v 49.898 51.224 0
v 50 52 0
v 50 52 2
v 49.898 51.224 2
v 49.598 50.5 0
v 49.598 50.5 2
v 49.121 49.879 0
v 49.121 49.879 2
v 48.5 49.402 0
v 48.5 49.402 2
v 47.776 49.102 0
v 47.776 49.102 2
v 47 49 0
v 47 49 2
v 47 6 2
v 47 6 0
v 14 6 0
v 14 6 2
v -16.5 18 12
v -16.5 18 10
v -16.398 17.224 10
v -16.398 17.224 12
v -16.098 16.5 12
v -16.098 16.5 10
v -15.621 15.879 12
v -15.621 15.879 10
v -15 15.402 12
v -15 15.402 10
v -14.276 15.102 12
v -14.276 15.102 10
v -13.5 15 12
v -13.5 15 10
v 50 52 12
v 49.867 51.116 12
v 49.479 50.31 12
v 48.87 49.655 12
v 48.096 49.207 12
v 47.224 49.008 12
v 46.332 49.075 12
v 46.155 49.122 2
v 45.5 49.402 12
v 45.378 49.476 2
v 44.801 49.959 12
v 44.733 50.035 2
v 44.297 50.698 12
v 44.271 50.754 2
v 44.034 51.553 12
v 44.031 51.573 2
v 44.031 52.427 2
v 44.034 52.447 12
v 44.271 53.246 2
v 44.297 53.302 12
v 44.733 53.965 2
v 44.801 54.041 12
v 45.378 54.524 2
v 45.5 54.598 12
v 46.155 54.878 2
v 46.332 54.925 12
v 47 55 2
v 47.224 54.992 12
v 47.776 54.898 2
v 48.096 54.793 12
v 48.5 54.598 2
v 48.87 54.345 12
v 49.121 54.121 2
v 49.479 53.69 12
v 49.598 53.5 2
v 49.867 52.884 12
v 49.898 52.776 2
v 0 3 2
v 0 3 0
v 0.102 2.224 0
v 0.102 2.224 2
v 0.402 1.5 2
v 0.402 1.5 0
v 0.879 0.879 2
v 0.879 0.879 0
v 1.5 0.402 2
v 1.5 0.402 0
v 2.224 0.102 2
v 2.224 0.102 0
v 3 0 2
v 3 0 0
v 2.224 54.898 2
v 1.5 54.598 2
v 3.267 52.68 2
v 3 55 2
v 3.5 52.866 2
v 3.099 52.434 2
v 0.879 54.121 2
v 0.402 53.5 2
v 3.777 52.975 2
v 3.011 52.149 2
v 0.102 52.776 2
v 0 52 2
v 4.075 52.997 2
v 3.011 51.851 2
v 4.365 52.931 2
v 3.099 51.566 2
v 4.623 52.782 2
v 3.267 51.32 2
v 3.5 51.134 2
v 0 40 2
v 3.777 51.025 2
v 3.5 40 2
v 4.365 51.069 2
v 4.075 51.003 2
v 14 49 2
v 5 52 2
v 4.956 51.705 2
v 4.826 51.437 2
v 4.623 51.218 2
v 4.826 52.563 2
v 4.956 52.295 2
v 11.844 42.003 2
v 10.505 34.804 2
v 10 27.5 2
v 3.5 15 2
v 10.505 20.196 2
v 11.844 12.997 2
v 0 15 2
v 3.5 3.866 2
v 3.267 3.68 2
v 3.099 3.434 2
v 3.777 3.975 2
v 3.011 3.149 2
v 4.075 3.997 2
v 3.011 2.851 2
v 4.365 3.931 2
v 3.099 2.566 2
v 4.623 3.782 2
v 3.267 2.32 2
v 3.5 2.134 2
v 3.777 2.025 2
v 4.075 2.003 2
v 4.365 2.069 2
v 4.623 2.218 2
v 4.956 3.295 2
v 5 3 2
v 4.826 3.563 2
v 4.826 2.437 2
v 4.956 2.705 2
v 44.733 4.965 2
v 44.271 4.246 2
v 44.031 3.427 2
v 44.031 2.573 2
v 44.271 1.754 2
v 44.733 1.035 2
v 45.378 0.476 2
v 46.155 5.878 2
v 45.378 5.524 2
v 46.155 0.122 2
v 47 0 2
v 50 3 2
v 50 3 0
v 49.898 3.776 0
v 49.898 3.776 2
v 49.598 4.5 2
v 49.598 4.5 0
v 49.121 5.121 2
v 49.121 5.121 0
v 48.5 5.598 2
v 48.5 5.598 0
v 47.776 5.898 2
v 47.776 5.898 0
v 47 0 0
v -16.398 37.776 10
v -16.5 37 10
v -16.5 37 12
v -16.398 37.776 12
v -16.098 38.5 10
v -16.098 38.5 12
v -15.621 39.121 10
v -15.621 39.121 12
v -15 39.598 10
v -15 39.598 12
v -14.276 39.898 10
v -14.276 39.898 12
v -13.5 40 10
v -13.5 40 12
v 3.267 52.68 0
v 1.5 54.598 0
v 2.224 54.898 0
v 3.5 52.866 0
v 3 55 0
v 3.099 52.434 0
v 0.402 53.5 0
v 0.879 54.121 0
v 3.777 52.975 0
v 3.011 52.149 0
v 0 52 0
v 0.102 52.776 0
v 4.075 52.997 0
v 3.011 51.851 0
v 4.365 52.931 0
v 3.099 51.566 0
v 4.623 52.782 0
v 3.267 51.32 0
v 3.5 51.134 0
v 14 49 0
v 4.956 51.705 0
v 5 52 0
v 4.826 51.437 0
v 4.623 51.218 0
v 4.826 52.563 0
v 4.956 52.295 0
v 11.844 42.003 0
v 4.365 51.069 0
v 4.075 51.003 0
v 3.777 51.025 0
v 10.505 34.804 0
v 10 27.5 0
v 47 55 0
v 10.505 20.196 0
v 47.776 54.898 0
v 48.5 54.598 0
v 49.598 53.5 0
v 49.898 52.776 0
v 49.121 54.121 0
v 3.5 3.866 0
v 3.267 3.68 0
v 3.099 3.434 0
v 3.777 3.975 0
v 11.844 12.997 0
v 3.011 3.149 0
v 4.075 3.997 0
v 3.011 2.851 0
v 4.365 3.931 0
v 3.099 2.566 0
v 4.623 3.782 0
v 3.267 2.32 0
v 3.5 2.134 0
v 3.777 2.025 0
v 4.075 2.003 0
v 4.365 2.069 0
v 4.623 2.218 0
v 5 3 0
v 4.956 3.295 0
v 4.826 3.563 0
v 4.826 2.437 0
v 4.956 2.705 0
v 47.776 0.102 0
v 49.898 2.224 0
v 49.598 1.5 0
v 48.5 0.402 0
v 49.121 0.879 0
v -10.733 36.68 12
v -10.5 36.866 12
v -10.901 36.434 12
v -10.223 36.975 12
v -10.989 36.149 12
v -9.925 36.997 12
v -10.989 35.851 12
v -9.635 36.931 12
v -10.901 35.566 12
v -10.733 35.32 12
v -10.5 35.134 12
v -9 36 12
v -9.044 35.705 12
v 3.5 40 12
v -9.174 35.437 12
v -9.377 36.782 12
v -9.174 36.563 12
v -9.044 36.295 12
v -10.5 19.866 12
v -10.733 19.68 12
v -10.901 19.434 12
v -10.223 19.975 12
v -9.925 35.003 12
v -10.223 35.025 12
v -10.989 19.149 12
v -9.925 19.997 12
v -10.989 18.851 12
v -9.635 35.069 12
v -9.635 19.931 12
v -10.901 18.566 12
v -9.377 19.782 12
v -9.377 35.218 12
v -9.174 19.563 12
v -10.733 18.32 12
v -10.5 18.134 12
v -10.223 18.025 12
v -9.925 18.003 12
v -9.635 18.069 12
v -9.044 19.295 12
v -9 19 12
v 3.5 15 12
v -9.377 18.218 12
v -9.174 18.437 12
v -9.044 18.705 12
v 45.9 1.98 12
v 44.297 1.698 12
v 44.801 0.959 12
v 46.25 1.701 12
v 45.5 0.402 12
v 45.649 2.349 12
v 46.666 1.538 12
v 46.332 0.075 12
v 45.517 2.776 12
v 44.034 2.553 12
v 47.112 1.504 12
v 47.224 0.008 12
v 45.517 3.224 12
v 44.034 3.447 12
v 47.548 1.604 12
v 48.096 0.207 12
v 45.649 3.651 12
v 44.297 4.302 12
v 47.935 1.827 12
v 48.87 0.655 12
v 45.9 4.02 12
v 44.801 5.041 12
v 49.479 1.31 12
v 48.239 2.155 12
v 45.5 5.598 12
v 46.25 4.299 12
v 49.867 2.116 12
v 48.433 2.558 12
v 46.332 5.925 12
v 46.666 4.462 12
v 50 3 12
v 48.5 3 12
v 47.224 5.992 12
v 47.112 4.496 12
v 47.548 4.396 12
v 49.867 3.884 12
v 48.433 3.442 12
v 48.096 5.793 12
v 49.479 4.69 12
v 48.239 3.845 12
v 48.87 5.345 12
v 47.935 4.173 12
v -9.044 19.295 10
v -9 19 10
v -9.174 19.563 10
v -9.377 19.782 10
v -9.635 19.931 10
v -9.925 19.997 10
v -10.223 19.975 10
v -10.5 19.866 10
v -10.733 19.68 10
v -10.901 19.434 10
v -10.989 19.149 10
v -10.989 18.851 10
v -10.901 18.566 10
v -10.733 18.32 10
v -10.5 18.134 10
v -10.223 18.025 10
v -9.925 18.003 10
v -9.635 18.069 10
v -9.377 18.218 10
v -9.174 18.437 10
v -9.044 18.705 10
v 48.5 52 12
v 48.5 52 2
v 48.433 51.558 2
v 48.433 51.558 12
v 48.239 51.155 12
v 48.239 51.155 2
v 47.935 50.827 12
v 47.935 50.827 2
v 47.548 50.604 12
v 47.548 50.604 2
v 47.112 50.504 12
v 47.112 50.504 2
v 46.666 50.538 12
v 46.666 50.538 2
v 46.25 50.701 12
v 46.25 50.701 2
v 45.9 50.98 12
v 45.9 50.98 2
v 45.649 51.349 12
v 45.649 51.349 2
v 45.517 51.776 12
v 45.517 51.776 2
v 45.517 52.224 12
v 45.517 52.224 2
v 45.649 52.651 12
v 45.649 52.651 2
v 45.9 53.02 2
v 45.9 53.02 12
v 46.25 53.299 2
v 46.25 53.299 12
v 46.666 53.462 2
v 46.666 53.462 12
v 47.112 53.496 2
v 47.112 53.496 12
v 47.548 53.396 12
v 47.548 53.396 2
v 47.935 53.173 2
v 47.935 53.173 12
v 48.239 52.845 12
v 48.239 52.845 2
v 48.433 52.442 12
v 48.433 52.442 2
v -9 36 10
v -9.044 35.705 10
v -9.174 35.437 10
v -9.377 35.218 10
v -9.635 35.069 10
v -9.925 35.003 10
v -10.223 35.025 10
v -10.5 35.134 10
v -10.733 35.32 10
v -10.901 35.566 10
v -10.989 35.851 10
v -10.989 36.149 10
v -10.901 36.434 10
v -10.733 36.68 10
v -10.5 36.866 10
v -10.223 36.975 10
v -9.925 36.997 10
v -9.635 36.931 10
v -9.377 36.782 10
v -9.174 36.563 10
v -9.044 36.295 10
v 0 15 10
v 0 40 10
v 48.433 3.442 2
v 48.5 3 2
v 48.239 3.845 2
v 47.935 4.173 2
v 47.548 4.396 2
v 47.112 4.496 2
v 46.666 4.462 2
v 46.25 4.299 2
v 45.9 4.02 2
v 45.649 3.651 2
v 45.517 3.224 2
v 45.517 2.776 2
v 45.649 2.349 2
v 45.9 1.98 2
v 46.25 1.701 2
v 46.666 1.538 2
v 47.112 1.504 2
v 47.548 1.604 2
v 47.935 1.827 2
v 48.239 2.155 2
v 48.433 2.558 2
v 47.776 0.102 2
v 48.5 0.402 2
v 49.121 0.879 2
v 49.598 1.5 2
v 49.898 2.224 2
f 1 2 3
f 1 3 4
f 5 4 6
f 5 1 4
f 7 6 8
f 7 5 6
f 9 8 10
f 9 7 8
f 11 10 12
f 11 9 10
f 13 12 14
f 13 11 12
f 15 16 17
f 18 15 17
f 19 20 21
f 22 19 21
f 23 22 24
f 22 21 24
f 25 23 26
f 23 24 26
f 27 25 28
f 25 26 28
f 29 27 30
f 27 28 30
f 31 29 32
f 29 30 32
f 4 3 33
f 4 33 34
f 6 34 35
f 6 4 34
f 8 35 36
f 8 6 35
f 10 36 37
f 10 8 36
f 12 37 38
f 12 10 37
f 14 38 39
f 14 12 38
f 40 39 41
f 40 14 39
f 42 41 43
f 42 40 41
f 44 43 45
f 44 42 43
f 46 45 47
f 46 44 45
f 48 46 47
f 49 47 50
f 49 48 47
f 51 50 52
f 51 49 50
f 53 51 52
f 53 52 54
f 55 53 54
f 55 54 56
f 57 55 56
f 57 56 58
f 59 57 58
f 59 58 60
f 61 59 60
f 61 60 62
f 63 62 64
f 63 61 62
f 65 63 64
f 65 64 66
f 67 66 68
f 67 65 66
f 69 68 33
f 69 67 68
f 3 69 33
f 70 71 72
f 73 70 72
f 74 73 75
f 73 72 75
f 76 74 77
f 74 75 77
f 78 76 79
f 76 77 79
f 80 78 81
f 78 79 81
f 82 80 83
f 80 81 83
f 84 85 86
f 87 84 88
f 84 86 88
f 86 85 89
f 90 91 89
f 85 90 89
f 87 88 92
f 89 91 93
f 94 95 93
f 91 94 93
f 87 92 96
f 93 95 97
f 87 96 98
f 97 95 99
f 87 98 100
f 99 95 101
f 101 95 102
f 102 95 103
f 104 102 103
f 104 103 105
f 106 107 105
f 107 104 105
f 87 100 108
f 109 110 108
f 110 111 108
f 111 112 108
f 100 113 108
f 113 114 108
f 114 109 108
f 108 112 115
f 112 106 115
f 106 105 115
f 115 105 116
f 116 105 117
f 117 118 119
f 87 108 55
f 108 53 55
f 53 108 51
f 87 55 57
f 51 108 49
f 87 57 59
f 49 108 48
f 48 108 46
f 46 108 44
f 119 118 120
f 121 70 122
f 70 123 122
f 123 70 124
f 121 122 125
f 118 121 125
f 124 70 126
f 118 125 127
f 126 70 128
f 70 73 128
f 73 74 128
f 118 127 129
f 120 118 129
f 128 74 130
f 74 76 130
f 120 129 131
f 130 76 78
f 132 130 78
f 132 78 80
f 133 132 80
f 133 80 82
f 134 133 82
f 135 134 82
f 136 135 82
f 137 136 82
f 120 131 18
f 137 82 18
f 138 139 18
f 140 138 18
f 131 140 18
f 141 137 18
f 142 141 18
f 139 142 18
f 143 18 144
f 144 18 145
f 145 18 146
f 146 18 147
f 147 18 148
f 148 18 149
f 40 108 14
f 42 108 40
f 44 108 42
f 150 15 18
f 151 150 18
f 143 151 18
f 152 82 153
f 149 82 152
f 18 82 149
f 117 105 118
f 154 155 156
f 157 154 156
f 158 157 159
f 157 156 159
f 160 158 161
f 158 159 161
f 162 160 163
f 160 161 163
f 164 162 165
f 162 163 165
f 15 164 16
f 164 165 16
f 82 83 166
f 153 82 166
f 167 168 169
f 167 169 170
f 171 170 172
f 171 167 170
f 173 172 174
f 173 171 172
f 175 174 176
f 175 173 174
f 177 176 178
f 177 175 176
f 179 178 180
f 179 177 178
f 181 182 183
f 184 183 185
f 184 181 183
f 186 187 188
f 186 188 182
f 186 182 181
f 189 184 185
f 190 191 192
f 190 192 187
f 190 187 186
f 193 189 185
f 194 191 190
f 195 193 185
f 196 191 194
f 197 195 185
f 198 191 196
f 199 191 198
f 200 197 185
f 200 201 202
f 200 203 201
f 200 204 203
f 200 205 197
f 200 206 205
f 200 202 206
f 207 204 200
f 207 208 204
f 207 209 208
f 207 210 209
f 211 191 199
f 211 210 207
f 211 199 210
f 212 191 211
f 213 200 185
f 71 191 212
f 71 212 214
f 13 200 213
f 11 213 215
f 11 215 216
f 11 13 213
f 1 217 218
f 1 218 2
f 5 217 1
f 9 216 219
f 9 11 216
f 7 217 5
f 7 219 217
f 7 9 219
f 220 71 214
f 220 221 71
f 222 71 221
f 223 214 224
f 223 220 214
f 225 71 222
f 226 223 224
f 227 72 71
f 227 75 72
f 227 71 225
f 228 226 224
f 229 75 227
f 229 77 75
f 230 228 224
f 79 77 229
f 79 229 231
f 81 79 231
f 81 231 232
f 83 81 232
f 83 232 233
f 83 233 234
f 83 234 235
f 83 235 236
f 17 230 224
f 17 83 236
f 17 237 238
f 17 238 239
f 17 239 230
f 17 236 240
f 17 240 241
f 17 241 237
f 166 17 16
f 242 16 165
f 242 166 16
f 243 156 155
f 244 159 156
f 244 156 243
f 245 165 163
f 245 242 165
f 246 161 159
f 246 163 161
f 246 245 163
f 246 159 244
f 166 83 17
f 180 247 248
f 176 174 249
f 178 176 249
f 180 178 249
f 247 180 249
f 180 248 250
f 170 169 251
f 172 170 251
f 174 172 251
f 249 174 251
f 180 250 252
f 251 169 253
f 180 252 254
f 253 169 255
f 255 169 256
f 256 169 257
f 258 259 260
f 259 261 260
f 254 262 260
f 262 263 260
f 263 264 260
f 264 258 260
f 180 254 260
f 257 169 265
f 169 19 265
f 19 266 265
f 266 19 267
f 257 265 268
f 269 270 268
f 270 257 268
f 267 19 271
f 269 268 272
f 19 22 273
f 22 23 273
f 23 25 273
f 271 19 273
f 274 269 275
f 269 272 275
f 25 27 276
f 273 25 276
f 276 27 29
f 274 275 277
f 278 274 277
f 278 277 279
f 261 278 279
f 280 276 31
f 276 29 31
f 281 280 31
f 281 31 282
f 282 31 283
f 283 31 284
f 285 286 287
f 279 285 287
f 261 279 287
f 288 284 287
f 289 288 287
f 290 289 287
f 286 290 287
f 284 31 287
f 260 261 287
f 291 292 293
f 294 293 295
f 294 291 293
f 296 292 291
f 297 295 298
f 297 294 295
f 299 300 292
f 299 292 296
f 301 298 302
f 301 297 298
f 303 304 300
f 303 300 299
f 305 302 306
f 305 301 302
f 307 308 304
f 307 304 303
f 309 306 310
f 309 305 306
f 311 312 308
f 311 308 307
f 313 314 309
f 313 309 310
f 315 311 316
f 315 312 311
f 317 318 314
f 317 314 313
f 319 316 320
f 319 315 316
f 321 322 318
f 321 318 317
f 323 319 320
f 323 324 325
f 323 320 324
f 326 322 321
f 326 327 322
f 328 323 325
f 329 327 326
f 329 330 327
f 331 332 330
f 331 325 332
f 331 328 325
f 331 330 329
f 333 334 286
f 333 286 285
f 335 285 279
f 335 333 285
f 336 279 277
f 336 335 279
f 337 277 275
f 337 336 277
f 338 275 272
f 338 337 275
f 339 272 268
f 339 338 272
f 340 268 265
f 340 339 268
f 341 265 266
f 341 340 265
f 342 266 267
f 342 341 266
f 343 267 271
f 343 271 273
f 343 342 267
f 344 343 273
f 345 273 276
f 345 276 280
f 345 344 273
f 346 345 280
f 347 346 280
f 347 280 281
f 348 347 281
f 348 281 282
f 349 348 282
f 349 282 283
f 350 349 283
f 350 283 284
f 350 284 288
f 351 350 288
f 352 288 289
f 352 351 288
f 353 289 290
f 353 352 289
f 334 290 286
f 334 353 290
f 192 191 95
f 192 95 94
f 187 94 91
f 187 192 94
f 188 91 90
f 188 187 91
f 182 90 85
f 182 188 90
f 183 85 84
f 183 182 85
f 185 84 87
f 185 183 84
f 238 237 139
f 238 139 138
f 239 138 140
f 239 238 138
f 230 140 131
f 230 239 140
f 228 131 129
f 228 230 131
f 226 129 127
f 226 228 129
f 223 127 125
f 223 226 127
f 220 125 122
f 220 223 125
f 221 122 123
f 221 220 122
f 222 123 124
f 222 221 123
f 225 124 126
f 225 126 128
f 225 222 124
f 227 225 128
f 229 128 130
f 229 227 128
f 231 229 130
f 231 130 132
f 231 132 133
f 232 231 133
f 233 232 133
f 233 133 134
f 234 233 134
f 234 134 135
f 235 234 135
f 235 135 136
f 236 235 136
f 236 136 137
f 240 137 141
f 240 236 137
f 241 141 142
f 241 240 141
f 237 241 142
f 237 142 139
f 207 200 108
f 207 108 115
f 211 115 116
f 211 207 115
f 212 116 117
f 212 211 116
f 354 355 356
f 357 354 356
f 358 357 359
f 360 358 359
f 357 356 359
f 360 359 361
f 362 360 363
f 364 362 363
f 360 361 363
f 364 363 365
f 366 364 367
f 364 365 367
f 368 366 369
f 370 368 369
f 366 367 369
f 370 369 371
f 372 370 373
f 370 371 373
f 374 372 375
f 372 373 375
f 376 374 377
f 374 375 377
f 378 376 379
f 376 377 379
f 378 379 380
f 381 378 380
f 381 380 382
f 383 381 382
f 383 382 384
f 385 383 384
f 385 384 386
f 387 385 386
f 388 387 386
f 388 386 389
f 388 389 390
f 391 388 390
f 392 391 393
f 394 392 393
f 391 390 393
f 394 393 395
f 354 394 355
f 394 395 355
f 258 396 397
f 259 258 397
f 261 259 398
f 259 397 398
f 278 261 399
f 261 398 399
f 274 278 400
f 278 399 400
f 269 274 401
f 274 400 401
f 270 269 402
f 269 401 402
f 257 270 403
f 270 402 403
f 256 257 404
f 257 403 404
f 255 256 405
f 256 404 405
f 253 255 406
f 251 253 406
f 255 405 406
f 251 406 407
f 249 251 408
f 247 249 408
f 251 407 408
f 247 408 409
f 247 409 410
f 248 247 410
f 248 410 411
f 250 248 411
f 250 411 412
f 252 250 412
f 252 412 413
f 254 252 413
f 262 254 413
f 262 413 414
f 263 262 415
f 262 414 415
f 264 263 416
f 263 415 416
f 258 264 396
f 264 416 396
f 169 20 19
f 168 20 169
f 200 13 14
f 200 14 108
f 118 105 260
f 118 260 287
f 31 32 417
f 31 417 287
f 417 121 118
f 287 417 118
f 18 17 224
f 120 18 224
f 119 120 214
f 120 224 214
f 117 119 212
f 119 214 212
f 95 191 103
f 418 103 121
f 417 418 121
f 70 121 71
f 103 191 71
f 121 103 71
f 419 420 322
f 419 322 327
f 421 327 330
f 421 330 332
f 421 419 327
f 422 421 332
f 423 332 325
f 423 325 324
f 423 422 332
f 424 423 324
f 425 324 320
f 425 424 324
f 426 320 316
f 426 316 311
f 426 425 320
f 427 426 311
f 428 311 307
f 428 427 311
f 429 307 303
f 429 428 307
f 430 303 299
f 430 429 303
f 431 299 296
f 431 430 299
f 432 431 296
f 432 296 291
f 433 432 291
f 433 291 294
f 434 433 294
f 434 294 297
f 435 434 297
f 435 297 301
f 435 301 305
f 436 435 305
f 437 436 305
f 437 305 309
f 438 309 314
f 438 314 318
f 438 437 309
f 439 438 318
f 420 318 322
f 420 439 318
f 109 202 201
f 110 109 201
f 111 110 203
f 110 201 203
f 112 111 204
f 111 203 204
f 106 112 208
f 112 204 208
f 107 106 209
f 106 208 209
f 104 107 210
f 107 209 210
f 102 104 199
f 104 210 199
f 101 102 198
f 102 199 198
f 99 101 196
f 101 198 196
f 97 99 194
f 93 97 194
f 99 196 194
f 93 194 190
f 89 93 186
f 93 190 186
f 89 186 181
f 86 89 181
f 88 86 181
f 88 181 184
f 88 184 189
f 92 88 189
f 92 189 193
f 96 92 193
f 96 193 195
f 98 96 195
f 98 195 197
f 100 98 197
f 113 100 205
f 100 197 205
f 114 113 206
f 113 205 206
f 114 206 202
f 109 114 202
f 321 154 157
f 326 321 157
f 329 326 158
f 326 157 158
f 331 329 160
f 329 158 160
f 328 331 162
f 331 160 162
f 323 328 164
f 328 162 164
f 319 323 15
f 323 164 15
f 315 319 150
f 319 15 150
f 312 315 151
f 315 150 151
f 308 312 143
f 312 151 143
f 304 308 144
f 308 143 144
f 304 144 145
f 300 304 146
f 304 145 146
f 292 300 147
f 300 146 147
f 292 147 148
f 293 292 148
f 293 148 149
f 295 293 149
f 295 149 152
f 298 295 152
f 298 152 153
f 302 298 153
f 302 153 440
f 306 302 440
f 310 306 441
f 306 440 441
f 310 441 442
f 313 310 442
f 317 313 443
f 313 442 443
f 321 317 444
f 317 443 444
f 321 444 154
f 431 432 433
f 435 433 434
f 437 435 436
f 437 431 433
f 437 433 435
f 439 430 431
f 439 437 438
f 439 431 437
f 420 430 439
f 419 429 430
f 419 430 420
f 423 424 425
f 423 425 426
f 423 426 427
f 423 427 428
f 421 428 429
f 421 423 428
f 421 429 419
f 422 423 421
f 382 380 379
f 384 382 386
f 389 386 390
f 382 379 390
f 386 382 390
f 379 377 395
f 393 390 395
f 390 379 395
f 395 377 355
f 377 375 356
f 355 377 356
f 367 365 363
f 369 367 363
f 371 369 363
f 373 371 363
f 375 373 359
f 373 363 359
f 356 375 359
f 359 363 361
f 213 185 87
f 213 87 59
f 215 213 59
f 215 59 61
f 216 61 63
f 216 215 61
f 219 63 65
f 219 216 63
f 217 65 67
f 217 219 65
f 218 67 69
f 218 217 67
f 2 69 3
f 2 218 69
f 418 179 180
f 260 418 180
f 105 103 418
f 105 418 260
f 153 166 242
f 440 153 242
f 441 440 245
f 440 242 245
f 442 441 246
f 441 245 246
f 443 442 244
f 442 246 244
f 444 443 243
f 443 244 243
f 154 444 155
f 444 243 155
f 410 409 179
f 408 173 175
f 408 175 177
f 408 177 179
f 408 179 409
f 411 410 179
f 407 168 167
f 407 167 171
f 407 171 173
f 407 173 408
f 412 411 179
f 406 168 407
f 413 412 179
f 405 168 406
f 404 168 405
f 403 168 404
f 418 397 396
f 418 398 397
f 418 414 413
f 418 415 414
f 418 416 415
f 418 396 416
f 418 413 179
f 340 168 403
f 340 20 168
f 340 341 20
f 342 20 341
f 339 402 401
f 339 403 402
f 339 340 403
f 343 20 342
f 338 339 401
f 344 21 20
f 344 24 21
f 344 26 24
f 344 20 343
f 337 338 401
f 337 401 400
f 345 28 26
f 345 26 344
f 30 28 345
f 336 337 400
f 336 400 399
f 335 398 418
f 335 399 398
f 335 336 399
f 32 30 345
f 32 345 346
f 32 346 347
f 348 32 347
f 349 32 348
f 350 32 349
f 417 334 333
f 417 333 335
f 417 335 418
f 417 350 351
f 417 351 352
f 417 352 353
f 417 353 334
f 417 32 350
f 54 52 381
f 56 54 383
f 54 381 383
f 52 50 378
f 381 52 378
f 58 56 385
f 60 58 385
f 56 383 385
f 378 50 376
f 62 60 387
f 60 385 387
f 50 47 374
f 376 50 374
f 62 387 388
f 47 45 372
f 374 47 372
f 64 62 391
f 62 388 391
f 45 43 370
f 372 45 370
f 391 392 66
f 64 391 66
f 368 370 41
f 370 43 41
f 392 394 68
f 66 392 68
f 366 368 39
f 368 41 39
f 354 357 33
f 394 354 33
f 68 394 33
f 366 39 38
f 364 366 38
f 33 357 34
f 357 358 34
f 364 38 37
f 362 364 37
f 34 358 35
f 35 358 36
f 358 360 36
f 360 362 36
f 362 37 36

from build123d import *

# Parameters (mm, degrees)
F0_R     = 1
F1_DEPTH = 2
F2_R     = 3
F2_R_2   = 1.5
F3_DEPTH = 10
F4_W     = 3.5
F4_H     = 12.5
F5_DEPTH = 6
F6_DEPTH = 8
F7_R     = 1
F8_DEPTH = 2


with BuildPart() as f1:
    # F0 (on Top) → F1 (new body)
    with BuildSketch(Plane.XY):
        with BuildLine():
            ThreePointArc((0, 3), (0.87868, 0.87868), (3, 0))
            Line((3, 0), (47, 0))
            ThreePointArc((47, 0), (49.12132, 0.87868), (50, 3))
            ThreePointArc((50, 3), (49.12132, 5.12132), (47, 6))
            Line((47, 6), (14, 6))
            ThreePointArc((14, 6), (11.07073, 16.577113), (10, 27.5))
            Line((10, 27.5), (0, 27.5))
            Line((0, 27.5), (0, 6))
            Line((0, 6), (0, 3))
        make_face()
        with Locations((4, 3)):
            Circle(F0_R, mode=Mode.SUBTRACT)
    extrude(amount=F1_DEPTH)

    # F2 (on face) → F3 (join)
    with BuildSketch(Plane.XY.offset(2)):
        with Locations((47, 3)):
            Circle(F2_R)
        with Locations((47, 3)):
            Circle(F2_R_2, mode=Mode.SUBTRACT)
    extrude(amount=F3_DEPTH)

    # F4 (on face) → F5 (join)
    with BuildSketch(Plane.XY.offset(2)):
        with Locations((1.75, 21.25)):
            Rectangle(F4_W, F4_H)
    extrude(amount=F5_DEPTH)

    # F4 (on face) → F6 (join)
    with BuildSketch(Plane.XY.offset(2)):
        with Locations((1.75, 21.25)):
            Rectangle(F4_W, F4_H)
    extrude(amount=F6_DEPTH)

    # F7 (on face) → F8 (join)
    with BuildSketch(Plane.XY.offset(10)):
        with BuildLine():
            Line((3.5, 15), (3.5, 27.5))
            Line((3.5, 27.5), (-16.5, 27.5))
            Line((-16.5, 27.5), (-16.5, 18))
            ThreePointArc((-16.5, 18), (-15.62132, 15.87868), (-13.5, 15))
            Line((-13.5, 15), (3.5, 15))
        make_face()
        with Locations((-10, 19)):
            Circle(F7_R, mode=Mode.SUBTRACT)
    extrude(amount=F8_DEPTH)

    # F9: F1 across face


with BuildPart() as f1_1:
    add(f1.part)
    add(f1.part.mirror(Plane(origin=(-1.261364, 27.5, 7.136364), x_dir=(-1, 0, 0), z_dir=(0, 1, 0))))


solid = f1_1.part
